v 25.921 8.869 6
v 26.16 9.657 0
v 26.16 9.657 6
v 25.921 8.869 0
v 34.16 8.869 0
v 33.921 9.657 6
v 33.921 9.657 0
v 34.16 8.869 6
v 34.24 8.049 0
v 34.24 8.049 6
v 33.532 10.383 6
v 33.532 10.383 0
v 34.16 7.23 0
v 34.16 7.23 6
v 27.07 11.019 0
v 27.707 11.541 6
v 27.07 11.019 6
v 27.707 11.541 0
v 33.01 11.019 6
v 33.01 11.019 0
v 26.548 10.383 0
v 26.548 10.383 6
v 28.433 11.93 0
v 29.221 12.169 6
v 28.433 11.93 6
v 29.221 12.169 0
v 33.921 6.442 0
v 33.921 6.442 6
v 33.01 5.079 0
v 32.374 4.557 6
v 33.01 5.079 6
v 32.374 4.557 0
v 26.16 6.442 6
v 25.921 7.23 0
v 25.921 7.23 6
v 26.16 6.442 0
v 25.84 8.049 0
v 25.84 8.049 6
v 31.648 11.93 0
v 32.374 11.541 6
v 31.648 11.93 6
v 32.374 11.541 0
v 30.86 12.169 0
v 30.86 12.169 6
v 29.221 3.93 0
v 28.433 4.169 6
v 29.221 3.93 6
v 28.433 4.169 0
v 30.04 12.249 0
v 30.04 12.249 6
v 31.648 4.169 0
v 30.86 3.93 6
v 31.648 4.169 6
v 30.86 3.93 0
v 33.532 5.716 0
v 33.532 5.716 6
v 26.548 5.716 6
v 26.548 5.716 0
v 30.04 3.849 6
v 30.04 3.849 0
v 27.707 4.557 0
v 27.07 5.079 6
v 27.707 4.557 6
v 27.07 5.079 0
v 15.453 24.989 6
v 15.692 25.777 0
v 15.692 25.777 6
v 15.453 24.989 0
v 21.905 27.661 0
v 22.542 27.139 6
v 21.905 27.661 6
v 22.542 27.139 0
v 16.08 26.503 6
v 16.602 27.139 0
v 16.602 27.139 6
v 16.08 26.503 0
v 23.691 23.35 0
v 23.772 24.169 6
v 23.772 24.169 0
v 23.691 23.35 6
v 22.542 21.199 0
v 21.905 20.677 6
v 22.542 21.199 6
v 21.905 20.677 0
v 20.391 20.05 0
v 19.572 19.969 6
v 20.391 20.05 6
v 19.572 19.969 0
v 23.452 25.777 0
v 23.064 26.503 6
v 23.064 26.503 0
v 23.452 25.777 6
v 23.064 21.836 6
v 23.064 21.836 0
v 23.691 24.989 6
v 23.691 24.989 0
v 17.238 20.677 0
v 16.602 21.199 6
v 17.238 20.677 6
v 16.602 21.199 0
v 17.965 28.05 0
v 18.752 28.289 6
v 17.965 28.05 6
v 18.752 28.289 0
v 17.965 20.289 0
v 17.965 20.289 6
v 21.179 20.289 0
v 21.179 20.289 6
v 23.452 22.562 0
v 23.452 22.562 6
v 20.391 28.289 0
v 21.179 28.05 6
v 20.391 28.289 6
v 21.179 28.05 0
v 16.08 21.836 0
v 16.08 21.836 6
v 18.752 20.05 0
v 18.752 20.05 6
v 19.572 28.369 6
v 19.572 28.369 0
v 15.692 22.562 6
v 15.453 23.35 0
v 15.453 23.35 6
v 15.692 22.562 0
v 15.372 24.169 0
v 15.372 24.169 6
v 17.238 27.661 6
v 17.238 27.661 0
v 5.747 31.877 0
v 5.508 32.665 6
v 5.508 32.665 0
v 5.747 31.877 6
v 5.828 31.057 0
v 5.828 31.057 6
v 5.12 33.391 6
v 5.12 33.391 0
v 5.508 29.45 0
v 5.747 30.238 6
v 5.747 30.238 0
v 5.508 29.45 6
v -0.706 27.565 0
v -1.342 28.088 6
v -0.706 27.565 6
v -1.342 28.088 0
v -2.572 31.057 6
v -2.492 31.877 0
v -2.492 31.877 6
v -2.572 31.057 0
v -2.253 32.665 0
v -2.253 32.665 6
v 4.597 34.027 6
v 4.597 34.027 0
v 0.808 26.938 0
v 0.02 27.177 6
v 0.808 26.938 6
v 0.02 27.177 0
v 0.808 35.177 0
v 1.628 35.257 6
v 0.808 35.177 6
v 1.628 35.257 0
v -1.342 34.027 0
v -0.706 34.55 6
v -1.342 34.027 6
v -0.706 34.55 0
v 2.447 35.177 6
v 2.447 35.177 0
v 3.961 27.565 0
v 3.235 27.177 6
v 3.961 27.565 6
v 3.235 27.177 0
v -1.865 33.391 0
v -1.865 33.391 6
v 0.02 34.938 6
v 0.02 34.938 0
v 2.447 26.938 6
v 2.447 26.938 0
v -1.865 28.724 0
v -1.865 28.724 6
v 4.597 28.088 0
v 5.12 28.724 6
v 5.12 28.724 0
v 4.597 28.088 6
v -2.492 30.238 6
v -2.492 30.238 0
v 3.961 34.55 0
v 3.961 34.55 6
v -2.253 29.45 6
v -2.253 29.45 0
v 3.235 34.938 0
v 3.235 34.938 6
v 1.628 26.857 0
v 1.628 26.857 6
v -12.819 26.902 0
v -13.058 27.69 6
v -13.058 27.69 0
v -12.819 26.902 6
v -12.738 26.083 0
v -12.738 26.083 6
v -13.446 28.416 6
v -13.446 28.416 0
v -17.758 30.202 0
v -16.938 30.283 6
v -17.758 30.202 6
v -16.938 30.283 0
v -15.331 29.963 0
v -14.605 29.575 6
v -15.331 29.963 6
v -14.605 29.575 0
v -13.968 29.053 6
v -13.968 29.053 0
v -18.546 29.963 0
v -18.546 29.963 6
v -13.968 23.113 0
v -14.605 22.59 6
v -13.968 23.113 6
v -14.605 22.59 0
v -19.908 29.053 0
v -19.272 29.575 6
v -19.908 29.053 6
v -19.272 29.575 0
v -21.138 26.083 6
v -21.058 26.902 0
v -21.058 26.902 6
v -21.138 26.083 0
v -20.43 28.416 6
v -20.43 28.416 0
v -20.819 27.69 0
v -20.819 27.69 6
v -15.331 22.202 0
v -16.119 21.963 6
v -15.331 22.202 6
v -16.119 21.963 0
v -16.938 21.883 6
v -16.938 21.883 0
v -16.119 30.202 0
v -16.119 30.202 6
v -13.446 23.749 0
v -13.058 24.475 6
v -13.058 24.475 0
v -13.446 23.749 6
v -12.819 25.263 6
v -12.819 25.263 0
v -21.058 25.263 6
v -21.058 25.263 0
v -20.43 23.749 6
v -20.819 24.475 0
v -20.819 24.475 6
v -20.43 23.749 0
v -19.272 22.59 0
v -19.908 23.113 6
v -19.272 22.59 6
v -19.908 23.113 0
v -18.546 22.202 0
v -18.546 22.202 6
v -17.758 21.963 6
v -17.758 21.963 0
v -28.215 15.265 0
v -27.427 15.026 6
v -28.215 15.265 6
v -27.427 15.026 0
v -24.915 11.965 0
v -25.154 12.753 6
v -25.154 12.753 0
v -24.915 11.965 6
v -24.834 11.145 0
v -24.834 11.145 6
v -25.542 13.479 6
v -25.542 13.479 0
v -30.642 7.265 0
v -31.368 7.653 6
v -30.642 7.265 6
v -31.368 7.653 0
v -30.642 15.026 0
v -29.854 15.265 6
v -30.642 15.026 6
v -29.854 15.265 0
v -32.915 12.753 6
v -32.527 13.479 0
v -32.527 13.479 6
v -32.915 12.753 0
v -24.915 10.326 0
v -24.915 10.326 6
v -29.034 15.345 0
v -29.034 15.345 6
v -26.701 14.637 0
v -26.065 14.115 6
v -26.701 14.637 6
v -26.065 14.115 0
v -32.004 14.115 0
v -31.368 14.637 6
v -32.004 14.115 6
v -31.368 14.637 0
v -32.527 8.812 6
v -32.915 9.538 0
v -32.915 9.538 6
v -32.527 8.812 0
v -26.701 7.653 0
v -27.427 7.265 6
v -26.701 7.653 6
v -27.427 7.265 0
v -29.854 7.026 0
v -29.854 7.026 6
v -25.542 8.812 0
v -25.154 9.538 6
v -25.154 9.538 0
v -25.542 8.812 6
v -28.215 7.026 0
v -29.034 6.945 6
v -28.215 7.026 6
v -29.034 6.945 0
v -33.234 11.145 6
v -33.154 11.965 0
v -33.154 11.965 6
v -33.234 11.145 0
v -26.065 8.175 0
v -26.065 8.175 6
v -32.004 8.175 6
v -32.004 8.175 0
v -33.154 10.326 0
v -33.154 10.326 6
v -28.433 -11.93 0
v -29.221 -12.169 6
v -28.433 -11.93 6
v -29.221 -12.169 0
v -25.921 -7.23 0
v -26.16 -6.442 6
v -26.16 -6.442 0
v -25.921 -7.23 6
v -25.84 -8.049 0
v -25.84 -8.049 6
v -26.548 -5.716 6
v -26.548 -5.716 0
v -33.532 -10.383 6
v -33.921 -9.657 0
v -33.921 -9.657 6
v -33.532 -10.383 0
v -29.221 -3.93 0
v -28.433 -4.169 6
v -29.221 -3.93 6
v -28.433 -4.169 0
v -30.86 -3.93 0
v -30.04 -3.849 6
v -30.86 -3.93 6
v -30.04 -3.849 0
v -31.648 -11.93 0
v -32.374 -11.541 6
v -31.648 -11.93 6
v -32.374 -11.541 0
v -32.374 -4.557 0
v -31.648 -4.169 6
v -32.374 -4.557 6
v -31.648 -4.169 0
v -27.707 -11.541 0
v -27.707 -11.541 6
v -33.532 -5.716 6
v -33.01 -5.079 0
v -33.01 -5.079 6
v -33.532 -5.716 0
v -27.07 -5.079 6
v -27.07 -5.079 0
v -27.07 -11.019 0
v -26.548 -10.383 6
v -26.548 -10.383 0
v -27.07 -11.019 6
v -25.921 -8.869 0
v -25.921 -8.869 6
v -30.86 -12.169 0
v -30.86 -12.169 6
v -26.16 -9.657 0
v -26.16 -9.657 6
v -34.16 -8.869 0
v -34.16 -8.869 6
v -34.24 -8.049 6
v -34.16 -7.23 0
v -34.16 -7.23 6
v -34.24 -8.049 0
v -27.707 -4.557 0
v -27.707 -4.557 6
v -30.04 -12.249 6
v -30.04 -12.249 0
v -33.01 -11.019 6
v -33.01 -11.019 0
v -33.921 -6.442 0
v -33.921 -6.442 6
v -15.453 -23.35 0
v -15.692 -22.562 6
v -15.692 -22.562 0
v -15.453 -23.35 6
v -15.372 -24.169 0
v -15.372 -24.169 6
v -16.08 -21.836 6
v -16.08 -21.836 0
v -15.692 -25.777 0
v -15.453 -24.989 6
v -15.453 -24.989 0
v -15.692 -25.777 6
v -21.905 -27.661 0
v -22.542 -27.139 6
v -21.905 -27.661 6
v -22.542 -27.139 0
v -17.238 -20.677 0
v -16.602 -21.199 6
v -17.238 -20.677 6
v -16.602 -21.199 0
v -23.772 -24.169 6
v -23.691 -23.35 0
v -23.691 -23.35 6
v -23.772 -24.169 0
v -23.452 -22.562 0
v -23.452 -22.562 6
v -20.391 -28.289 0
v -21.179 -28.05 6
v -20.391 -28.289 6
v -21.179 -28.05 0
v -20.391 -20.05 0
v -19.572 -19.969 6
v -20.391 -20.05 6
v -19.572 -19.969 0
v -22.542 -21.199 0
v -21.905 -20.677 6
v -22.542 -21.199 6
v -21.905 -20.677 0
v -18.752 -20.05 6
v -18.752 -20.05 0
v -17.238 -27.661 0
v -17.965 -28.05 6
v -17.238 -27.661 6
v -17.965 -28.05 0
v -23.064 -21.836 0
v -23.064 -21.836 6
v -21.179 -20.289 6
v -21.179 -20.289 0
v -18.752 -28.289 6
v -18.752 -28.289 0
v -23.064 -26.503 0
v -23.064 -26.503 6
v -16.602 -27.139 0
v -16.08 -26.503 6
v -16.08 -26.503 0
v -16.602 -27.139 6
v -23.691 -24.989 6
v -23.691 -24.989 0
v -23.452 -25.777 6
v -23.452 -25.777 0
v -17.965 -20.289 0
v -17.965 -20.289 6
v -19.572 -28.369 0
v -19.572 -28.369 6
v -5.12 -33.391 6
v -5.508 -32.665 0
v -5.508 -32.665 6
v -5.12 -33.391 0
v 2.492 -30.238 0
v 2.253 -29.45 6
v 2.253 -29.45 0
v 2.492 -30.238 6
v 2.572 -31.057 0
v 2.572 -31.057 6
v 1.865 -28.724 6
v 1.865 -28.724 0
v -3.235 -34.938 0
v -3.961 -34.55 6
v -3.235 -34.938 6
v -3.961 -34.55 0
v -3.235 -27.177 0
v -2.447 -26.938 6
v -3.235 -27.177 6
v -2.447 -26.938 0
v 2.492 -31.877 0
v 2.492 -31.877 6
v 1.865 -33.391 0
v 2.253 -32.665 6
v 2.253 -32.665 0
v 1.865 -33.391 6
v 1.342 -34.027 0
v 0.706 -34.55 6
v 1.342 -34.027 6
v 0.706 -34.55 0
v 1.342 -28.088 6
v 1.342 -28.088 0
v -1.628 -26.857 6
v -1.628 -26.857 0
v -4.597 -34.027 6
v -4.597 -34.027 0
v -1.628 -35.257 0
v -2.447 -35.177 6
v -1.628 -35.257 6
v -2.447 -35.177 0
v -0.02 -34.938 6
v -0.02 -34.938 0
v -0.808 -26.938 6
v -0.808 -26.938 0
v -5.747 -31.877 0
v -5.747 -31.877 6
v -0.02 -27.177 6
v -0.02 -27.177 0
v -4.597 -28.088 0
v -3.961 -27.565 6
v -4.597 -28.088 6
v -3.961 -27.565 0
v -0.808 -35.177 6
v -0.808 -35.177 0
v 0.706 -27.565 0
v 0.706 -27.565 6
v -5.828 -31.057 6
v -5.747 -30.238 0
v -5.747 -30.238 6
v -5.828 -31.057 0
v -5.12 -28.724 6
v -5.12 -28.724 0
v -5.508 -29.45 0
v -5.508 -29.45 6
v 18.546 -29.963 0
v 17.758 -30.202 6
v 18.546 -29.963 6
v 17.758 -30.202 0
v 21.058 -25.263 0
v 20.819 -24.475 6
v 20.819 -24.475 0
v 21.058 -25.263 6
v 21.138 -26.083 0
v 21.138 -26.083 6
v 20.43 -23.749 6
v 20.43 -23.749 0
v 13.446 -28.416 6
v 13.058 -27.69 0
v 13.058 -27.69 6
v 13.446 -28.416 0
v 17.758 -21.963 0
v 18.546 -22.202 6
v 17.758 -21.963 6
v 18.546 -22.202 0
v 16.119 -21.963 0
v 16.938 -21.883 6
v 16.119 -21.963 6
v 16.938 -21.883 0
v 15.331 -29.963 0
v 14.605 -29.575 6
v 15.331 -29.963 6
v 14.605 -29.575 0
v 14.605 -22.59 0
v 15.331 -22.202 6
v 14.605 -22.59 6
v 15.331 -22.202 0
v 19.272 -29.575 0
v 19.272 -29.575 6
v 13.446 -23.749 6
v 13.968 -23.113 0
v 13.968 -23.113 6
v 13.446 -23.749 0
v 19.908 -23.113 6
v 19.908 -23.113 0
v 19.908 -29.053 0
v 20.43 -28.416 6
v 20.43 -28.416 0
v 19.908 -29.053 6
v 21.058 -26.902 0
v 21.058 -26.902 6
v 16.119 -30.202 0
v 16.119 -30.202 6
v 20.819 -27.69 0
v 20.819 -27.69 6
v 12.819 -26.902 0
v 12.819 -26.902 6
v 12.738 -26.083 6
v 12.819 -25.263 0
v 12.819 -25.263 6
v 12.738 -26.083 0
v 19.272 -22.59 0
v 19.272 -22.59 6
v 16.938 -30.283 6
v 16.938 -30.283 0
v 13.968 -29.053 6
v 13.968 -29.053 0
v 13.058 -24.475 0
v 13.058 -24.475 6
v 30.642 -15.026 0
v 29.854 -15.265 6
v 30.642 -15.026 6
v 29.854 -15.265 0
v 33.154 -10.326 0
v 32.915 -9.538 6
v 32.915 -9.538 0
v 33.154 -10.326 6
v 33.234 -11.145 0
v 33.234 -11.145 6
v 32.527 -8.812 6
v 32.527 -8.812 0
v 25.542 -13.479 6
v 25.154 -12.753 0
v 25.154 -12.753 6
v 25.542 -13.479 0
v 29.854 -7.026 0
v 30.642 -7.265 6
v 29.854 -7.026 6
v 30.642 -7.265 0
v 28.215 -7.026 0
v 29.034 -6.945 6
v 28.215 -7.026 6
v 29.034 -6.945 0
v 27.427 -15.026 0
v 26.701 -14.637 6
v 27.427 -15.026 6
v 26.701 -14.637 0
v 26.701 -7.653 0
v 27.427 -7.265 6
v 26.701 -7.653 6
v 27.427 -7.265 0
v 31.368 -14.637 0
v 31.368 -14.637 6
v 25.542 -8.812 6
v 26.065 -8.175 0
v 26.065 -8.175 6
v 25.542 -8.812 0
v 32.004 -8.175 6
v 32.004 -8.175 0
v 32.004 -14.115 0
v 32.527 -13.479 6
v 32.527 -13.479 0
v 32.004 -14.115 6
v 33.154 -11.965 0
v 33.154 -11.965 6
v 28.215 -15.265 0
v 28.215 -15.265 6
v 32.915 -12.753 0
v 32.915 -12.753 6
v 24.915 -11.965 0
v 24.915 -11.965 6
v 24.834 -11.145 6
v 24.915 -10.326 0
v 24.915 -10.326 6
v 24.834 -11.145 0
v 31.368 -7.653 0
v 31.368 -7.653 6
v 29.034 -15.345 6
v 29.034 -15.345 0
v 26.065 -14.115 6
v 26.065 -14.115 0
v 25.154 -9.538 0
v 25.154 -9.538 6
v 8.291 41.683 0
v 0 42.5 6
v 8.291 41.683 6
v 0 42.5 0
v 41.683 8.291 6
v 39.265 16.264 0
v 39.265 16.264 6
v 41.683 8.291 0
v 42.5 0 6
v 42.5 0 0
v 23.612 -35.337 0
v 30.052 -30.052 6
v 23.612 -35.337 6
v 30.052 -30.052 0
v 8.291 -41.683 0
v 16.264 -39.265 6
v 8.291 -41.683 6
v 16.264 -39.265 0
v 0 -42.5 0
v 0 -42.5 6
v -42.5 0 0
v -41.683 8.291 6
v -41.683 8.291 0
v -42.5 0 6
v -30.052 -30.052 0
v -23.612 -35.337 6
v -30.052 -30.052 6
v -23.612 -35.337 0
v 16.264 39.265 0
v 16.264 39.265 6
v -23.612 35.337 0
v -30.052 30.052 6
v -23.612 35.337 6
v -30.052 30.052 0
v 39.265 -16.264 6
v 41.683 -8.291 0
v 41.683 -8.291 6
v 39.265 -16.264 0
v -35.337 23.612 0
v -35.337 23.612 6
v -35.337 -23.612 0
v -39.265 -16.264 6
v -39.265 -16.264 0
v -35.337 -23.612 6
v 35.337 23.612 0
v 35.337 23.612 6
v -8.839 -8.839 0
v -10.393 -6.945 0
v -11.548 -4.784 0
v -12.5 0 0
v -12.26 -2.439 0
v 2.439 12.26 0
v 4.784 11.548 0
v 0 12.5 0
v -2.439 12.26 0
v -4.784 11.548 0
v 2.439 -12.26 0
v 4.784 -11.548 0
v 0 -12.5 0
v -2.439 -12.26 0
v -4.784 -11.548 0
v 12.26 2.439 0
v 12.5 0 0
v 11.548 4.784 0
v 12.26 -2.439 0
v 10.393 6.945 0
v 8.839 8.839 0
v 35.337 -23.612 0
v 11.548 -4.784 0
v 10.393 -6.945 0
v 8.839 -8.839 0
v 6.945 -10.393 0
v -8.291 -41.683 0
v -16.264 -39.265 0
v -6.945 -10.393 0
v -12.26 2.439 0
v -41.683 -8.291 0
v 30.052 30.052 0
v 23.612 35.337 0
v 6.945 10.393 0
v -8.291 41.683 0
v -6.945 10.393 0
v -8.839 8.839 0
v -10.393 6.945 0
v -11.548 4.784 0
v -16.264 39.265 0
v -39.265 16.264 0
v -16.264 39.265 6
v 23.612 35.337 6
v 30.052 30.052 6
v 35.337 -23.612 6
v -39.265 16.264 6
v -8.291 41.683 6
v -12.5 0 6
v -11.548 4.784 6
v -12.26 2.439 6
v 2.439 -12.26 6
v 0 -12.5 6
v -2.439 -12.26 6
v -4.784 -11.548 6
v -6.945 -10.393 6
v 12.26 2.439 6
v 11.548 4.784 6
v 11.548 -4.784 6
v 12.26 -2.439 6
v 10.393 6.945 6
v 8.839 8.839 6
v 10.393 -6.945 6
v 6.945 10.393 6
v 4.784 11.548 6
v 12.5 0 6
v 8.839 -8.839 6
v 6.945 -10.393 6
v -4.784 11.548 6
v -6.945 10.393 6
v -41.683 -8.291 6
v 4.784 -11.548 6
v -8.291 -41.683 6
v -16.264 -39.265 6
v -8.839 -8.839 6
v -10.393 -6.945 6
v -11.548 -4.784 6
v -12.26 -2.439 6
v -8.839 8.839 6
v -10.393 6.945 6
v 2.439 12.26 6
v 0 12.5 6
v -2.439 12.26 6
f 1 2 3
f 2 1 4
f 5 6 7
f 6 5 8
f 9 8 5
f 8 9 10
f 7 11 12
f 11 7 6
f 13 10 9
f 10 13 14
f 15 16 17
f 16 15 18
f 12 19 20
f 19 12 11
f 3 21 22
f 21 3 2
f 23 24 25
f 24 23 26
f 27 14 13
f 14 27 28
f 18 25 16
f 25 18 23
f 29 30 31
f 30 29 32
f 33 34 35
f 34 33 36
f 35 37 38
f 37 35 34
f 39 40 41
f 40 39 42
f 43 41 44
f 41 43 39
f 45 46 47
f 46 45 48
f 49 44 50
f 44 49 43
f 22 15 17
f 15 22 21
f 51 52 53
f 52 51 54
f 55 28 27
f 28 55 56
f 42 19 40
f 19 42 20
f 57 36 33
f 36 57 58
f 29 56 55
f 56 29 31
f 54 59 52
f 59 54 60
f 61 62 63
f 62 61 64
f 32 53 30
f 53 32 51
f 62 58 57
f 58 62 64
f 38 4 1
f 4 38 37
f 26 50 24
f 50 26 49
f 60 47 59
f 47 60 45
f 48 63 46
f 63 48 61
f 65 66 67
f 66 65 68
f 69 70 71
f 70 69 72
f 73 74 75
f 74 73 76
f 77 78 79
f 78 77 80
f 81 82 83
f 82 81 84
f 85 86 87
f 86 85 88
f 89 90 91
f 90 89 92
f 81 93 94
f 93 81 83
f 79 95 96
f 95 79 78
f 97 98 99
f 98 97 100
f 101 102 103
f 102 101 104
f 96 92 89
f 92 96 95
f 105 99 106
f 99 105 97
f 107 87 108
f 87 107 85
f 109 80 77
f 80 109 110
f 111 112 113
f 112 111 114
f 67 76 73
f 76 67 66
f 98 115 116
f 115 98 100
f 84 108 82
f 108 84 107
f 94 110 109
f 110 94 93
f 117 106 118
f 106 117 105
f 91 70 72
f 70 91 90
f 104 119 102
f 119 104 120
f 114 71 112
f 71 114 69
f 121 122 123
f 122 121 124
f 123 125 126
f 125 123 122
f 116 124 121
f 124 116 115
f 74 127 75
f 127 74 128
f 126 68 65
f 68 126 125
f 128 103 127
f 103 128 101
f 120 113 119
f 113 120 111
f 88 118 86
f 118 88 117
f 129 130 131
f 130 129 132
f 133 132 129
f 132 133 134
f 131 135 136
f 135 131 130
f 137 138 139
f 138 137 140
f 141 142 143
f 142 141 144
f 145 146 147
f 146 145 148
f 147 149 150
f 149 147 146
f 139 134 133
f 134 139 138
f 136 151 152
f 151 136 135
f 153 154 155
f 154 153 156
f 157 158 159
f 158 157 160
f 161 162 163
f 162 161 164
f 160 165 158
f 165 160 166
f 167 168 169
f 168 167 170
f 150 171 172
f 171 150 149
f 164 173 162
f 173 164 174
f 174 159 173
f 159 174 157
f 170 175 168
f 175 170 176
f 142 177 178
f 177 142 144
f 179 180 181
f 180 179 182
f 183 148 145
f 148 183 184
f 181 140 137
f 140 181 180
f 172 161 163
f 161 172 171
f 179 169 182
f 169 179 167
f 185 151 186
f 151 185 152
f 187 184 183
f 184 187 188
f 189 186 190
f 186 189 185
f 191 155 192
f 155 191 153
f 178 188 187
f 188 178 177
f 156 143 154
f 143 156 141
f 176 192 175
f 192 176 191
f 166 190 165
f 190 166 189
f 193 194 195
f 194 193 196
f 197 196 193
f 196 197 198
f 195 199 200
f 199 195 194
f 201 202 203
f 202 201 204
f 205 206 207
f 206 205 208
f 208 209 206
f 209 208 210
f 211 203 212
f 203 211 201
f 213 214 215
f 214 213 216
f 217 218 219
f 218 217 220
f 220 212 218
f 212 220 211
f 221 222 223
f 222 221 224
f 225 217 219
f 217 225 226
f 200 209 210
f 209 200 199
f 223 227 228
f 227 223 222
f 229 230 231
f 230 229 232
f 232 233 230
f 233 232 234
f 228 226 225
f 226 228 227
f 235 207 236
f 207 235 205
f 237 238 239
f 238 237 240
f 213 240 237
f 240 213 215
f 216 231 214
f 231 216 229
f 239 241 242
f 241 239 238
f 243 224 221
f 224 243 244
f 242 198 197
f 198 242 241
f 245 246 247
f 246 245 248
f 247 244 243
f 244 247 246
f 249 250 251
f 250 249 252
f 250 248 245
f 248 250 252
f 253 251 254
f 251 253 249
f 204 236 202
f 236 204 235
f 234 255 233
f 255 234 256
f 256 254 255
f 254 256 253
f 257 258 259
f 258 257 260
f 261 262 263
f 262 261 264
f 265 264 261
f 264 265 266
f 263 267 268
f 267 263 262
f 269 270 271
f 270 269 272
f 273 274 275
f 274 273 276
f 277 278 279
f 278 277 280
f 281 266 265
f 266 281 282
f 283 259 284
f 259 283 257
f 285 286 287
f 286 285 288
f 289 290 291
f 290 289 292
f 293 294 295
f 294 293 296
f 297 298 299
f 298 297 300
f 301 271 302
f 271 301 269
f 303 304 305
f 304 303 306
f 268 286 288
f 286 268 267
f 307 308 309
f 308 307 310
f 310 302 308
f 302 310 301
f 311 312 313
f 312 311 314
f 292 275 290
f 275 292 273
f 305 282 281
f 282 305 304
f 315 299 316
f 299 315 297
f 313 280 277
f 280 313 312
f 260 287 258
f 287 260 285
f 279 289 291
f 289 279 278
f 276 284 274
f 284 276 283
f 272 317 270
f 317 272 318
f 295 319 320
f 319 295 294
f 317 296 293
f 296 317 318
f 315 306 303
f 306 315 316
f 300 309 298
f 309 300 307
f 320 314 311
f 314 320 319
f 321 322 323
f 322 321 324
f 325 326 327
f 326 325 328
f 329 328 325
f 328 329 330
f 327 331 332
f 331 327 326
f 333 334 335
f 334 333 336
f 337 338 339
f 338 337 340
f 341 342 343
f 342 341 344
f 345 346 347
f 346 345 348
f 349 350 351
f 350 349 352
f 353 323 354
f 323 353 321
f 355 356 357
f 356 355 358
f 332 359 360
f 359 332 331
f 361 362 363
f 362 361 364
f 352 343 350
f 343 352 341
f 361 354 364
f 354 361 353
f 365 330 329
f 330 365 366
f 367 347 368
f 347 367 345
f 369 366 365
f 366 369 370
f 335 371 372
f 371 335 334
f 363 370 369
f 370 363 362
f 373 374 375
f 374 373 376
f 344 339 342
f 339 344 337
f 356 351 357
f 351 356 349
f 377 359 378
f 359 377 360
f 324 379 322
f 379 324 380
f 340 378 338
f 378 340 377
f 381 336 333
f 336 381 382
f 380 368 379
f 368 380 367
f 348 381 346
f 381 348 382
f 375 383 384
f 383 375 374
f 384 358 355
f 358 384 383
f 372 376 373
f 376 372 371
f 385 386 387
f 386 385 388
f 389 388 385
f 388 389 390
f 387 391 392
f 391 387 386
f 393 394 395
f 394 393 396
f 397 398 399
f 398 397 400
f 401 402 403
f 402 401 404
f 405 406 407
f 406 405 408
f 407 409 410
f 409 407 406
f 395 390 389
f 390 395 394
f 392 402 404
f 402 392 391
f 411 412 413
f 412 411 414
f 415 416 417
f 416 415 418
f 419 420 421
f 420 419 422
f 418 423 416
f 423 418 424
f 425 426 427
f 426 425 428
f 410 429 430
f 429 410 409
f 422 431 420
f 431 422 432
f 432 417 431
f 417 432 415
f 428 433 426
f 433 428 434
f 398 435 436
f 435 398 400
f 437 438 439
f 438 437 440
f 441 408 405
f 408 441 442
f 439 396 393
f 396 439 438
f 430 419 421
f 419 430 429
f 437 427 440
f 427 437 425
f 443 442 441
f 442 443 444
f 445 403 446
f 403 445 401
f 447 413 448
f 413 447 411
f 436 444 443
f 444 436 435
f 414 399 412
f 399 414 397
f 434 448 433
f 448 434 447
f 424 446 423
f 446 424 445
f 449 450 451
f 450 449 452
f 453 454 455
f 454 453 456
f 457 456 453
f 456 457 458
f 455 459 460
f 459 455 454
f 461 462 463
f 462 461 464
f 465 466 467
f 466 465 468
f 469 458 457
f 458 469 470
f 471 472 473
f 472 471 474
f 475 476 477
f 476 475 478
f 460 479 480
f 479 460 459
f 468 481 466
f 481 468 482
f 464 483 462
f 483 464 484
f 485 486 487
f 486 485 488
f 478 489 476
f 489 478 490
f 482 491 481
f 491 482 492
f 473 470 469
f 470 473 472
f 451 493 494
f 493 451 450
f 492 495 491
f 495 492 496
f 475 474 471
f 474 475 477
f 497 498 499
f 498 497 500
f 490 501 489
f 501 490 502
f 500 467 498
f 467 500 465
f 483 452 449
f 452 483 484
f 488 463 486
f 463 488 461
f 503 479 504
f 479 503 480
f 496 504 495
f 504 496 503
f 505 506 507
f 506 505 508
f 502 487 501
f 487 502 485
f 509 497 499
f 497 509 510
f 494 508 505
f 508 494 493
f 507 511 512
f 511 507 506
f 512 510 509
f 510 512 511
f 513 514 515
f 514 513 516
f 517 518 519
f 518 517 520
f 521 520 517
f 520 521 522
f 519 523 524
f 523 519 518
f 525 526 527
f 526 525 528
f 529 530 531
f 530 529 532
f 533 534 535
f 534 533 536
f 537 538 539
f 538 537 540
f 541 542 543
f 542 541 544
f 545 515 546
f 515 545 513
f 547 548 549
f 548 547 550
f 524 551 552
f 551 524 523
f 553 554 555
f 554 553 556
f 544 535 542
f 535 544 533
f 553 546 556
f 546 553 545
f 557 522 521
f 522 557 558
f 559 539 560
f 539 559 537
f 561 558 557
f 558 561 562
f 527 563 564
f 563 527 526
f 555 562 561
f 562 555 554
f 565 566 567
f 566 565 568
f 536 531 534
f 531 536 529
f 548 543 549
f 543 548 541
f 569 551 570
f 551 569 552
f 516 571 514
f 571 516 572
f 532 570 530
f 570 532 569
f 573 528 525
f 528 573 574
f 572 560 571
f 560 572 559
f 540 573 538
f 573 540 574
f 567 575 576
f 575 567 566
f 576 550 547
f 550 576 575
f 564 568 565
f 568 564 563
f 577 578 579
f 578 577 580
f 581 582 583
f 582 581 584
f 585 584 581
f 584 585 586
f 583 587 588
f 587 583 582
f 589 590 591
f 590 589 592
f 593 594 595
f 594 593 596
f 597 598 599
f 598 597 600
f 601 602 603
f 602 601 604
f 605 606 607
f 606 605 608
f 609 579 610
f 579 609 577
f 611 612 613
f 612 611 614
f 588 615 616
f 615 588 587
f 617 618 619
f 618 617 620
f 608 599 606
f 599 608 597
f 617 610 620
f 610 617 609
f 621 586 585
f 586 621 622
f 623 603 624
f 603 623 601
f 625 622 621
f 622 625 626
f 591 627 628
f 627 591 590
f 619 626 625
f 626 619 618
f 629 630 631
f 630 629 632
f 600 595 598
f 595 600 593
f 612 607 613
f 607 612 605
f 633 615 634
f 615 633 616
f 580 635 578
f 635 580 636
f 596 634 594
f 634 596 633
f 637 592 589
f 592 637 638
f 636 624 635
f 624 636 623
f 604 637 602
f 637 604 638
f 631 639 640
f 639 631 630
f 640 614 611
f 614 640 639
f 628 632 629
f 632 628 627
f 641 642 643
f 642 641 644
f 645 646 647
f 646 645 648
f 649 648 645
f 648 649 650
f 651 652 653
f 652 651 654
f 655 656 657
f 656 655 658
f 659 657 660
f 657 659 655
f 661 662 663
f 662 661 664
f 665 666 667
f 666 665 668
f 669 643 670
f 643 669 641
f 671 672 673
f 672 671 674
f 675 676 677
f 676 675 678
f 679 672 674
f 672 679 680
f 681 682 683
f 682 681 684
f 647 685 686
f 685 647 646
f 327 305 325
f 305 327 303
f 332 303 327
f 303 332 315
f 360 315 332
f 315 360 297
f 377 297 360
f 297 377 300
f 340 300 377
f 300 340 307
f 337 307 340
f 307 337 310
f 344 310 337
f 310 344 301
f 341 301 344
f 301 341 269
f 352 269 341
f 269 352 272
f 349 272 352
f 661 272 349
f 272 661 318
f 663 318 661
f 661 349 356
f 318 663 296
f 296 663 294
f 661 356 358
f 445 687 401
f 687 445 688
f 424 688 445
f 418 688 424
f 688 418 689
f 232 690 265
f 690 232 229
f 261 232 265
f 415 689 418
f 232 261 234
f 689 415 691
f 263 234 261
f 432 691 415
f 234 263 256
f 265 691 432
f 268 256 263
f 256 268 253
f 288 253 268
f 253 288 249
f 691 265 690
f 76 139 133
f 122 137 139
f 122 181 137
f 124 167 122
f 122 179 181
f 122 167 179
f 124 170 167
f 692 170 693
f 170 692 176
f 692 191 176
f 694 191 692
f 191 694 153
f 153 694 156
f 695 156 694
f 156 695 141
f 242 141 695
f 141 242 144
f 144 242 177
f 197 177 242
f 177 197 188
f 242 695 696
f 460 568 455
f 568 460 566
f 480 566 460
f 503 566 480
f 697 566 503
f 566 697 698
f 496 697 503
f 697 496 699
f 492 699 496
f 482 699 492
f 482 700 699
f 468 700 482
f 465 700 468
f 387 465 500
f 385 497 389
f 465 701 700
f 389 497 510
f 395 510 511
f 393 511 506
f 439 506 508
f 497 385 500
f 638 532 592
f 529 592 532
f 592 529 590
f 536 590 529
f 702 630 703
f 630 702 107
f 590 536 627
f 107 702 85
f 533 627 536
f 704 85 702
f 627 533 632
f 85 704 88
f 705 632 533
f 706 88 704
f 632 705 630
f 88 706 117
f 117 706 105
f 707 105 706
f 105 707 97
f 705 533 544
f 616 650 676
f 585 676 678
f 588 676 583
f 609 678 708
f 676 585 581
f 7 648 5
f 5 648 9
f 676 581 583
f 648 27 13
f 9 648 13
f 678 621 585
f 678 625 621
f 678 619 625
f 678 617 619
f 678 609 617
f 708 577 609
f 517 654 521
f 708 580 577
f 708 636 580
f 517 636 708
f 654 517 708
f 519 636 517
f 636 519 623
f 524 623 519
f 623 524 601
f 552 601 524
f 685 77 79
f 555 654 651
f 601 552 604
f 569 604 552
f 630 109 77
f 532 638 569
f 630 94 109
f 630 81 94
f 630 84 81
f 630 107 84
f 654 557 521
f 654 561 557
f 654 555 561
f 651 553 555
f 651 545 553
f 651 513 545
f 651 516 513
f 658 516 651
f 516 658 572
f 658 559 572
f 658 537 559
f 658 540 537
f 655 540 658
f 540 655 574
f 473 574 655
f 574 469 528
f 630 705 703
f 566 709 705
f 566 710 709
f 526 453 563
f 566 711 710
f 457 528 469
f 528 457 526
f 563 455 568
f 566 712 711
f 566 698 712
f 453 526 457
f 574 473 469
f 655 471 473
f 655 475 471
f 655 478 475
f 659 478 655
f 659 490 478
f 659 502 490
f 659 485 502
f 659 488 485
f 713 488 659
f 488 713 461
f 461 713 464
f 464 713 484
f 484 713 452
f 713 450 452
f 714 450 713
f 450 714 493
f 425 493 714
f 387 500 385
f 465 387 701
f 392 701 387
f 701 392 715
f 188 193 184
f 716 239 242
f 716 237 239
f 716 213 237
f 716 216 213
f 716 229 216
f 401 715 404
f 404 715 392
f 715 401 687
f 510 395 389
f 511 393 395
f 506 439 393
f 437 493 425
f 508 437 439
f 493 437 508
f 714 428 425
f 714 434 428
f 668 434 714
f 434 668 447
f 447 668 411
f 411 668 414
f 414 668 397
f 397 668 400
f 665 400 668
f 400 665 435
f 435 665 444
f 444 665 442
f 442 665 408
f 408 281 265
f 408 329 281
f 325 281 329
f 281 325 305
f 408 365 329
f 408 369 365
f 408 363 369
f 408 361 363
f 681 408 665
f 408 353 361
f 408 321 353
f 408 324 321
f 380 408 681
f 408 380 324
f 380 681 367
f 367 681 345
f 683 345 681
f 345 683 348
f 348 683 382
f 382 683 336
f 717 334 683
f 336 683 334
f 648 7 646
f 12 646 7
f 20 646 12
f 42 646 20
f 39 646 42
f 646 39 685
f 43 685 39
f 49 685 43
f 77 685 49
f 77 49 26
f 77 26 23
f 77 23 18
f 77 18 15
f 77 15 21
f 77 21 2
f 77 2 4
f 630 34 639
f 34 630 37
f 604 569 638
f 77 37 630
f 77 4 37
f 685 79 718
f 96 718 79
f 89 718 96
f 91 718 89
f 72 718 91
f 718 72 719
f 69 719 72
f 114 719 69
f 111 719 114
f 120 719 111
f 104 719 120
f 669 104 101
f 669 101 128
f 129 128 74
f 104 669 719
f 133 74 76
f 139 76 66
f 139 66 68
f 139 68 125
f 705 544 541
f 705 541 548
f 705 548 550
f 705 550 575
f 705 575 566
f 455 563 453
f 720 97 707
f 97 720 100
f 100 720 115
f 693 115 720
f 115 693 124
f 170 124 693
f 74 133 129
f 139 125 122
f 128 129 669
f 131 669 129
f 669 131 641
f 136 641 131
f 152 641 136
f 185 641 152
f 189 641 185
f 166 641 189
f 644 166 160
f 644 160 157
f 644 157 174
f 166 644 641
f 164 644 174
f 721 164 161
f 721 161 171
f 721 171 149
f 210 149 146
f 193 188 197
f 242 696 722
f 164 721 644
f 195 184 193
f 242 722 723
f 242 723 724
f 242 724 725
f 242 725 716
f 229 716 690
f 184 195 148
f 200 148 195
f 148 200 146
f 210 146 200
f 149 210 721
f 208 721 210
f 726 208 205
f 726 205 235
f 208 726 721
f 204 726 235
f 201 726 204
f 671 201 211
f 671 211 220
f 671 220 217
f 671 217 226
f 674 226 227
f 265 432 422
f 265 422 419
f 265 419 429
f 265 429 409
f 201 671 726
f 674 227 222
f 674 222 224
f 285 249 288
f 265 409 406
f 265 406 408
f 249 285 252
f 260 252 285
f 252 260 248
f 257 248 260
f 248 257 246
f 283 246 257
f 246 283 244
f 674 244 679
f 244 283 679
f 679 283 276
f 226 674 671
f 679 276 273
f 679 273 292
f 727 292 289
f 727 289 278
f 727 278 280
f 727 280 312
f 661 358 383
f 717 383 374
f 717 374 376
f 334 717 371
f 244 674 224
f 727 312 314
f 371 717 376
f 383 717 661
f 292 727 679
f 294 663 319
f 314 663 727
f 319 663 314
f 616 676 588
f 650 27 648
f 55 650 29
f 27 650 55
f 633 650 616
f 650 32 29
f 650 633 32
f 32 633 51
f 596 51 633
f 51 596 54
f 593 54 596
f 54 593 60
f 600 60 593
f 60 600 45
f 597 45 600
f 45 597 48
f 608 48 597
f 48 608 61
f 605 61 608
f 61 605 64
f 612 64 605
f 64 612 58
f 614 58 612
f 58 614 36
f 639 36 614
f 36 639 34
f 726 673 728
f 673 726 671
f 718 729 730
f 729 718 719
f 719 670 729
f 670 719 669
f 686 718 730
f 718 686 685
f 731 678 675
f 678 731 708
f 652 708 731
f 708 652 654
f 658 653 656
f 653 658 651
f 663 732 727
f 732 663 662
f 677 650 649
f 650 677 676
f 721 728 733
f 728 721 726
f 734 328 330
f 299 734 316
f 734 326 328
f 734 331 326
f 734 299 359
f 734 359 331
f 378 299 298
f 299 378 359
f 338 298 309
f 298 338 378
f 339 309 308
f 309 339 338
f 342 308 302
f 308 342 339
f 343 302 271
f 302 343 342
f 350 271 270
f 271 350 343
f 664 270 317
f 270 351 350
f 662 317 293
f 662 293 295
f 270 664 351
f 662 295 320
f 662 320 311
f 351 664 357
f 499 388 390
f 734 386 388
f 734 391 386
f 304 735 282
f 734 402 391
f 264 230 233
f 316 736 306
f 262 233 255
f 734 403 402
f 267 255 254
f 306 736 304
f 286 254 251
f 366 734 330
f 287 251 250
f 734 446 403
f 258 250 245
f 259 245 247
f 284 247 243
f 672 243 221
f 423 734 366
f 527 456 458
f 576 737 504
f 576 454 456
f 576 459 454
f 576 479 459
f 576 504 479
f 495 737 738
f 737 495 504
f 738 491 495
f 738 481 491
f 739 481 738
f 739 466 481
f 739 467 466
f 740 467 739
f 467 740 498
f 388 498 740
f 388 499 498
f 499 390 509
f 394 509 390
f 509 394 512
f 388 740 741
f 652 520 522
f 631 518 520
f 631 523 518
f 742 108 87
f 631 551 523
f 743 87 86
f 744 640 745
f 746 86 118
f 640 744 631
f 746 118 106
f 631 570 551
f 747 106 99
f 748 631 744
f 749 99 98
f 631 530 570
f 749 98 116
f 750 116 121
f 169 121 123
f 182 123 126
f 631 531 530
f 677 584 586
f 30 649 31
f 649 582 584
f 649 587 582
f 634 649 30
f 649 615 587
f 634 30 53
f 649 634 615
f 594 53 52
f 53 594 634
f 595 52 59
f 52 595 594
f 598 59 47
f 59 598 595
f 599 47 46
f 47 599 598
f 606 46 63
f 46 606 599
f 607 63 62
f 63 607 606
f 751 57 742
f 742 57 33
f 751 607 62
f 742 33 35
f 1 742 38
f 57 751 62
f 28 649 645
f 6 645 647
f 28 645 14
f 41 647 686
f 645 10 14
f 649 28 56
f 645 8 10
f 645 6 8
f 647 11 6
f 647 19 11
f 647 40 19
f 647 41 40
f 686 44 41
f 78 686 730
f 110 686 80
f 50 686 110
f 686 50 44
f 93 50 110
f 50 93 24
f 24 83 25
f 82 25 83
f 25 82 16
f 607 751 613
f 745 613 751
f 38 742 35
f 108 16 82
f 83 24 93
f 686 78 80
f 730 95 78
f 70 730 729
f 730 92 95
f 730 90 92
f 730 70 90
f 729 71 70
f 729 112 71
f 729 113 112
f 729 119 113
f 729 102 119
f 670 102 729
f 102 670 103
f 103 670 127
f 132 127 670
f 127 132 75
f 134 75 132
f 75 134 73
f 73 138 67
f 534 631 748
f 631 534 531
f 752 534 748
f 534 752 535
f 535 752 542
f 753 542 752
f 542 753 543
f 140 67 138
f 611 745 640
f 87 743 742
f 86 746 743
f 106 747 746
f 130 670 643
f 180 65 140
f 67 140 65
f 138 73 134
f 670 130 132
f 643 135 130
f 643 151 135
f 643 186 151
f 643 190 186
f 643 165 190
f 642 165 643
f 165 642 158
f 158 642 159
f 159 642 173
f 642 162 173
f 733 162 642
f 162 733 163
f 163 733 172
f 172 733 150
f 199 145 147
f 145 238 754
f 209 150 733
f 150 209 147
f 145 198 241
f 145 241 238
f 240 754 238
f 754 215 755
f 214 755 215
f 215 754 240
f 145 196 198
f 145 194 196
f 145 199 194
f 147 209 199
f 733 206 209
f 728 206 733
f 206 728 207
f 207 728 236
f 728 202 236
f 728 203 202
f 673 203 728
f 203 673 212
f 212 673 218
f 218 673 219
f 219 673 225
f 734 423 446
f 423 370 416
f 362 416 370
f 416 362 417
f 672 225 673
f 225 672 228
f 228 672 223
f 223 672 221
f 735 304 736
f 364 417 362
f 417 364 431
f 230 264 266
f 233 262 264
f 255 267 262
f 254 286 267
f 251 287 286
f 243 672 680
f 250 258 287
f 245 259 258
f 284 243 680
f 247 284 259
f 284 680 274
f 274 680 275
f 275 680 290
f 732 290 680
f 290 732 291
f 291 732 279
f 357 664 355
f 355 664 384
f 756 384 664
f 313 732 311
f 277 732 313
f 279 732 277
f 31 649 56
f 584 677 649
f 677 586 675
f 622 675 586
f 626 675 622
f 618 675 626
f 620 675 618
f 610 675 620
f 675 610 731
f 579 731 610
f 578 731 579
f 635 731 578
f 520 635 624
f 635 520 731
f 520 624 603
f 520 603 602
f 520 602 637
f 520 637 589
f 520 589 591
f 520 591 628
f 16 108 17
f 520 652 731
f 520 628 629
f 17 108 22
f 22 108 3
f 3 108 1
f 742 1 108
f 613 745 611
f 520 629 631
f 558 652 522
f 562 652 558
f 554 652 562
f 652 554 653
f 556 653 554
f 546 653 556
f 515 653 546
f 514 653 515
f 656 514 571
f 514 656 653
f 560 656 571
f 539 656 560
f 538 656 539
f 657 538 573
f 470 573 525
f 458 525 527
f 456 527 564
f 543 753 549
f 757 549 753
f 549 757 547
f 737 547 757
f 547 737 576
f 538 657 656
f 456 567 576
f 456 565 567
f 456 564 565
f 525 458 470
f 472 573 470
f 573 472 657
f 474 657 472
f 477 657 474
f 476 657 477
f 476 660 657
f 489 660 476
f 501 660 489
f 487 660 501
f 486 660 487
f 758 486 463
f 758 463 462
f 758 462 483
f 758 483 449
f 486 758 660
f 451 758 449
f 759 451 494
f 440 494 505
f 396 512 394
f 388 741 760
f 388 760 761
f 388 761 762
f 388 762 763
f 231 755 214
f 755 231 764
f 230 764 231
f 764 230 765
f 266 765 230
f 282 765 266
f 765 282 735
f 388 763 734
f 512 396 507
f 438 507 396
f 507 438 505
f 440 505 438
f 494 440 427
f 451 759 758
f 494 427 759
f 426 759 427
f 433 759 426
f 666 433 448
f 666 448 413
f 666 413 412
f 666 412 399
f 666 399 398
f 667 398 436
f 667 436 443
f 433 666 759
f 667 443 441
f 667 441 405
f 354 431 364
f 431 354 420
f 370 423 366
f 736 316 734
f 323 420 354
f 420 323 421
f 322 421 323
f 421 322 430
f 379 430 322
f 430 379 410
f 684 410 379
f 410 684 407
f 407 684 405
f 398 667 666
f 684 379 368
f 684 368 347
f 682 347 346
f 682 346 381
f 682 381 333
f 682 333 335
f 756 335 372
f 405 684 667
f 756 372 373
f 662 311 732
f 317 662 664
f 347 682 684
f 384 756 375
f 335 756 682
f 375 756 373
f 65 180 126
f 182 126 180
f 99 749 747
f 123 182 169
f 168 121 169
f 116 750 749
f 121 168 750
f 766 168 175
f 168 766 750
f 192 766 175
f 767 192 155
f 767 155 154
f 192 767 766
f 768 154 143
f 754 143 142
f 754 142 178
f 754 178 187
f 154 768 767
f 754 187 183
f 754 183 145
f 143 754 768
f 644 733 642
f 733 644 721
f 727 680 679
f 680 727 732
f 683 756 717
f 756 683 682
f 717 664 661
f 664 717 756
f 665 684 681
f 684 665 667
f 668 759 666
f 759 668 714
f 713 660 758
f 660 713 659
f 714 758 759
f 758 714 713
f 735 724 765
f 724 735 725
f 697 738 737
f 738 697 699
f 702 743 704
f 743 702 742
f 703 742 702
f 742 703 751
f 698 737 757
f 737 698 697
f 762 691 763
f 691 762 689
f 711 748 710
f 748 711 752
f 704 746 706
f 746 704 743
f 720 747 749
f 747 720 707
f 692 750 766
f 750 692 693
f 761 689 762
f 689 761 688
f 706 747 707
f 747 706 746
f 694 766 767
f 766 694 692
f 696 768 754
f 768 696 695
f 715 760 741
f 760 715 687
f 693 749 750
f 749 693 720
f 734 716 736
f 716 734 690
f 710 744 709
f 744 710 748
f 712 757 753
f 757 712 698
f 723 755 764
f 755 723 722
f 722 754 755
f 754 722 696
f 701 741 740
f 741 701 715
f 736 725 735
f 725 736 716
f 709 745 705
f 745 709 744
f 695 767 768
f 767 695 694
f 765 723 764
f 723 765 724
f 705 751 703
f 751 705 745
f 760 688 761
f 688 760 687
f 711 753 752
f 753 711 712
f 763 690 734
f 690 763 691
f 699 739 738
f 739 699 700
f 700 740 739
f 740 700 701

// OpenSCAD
$fn = 32;

// ----------------------------------------------------------------------
// Flange Ø85 x 6
// 10 holes on a Ø62.2 bolt circle, bolted joints
// ----------------------------------------------------------------------

// --- parameters (mm) ---
flange_d = 85;   // outside diameter of the flange
thickness = 6;   // flange thickness
holes = 10;      // number of bolt holes
pcd = 62.2;      // bolt circle diameter
start_deg = 15;  // angle of the first hole, from +X
hole_d = 8.4;    // bolt hole diameter
bore_d = 25;     // central through bore
hub_d = 37;      // hub outside diameter
hub_h = 0;       // hub height above the flange face (0 = no hub)

// --- derived feature positions (mm) ---
height = thickness + hub_h;  // = 6   overall height of the part
pcd_r = pcd / 2;             // = 31.1   bolt circle radius
hole_step = 360 / holes;     // = 36   angular pitch
feature_centers = [
  [pcd_r * cos(start_deg + 0 * hole_step), pcd_r * sin(start_deg + 0 * hole_step)],
  [pcd_r * cos(start_deg + 1 * hole_step), pcd_r * sin(start_deg + 1 * hole_step)],
  [pcd_r * cos(start_deg + 2 * hole_step), pcd_r * sin(start_deg + 2 * hole_step)],
  [pcd_r * cos(start_deg + 3 * hole_step), pcd_r * sin(start_deg + 3 * hole_step)],
  [pcd_r * cos(start_deg + 4 * hole_step), pcd_r * sin(start_deg + 4 * hole_step)],
  [pcd_r * cos(start_deg + 5 * hole_step), pcd_r * sin(start_deg + 5 * hole_step)],
  [pcd_r * cos(start_deg + 6 * hole_step), pcd_r * sin(start_deg + 6 * hole_step)],
  [pcd_r * cos(start_deg + 7 * hole_step), pcd_r * sin(start_deg + 7 * hole_step)],
  [pcd_r * cos(start_deg + 8 * hole_step), pcd_r * sin(start_deg + 8 * hole_step)],
  [pcd_r * cos(start_deg + 9 * hole_step), pcd_r * sin(start_deg + 9 * hole_step)]
];   // bolt hole centres on the pitch circle

// flange disc, every hole and the bore cut straight through
difference() {
  union() {
    cylinder(d = flange_d, h = thickness);
  }
  translate([0, 0, -1]) cylinder(d = bore_d, h = height + 2);  // bore, through
  for (centre = feature_centers)
    translate([centre[0], centre[1], -1]) cylinder(d = hole_d, h = thickness + 2);
}
